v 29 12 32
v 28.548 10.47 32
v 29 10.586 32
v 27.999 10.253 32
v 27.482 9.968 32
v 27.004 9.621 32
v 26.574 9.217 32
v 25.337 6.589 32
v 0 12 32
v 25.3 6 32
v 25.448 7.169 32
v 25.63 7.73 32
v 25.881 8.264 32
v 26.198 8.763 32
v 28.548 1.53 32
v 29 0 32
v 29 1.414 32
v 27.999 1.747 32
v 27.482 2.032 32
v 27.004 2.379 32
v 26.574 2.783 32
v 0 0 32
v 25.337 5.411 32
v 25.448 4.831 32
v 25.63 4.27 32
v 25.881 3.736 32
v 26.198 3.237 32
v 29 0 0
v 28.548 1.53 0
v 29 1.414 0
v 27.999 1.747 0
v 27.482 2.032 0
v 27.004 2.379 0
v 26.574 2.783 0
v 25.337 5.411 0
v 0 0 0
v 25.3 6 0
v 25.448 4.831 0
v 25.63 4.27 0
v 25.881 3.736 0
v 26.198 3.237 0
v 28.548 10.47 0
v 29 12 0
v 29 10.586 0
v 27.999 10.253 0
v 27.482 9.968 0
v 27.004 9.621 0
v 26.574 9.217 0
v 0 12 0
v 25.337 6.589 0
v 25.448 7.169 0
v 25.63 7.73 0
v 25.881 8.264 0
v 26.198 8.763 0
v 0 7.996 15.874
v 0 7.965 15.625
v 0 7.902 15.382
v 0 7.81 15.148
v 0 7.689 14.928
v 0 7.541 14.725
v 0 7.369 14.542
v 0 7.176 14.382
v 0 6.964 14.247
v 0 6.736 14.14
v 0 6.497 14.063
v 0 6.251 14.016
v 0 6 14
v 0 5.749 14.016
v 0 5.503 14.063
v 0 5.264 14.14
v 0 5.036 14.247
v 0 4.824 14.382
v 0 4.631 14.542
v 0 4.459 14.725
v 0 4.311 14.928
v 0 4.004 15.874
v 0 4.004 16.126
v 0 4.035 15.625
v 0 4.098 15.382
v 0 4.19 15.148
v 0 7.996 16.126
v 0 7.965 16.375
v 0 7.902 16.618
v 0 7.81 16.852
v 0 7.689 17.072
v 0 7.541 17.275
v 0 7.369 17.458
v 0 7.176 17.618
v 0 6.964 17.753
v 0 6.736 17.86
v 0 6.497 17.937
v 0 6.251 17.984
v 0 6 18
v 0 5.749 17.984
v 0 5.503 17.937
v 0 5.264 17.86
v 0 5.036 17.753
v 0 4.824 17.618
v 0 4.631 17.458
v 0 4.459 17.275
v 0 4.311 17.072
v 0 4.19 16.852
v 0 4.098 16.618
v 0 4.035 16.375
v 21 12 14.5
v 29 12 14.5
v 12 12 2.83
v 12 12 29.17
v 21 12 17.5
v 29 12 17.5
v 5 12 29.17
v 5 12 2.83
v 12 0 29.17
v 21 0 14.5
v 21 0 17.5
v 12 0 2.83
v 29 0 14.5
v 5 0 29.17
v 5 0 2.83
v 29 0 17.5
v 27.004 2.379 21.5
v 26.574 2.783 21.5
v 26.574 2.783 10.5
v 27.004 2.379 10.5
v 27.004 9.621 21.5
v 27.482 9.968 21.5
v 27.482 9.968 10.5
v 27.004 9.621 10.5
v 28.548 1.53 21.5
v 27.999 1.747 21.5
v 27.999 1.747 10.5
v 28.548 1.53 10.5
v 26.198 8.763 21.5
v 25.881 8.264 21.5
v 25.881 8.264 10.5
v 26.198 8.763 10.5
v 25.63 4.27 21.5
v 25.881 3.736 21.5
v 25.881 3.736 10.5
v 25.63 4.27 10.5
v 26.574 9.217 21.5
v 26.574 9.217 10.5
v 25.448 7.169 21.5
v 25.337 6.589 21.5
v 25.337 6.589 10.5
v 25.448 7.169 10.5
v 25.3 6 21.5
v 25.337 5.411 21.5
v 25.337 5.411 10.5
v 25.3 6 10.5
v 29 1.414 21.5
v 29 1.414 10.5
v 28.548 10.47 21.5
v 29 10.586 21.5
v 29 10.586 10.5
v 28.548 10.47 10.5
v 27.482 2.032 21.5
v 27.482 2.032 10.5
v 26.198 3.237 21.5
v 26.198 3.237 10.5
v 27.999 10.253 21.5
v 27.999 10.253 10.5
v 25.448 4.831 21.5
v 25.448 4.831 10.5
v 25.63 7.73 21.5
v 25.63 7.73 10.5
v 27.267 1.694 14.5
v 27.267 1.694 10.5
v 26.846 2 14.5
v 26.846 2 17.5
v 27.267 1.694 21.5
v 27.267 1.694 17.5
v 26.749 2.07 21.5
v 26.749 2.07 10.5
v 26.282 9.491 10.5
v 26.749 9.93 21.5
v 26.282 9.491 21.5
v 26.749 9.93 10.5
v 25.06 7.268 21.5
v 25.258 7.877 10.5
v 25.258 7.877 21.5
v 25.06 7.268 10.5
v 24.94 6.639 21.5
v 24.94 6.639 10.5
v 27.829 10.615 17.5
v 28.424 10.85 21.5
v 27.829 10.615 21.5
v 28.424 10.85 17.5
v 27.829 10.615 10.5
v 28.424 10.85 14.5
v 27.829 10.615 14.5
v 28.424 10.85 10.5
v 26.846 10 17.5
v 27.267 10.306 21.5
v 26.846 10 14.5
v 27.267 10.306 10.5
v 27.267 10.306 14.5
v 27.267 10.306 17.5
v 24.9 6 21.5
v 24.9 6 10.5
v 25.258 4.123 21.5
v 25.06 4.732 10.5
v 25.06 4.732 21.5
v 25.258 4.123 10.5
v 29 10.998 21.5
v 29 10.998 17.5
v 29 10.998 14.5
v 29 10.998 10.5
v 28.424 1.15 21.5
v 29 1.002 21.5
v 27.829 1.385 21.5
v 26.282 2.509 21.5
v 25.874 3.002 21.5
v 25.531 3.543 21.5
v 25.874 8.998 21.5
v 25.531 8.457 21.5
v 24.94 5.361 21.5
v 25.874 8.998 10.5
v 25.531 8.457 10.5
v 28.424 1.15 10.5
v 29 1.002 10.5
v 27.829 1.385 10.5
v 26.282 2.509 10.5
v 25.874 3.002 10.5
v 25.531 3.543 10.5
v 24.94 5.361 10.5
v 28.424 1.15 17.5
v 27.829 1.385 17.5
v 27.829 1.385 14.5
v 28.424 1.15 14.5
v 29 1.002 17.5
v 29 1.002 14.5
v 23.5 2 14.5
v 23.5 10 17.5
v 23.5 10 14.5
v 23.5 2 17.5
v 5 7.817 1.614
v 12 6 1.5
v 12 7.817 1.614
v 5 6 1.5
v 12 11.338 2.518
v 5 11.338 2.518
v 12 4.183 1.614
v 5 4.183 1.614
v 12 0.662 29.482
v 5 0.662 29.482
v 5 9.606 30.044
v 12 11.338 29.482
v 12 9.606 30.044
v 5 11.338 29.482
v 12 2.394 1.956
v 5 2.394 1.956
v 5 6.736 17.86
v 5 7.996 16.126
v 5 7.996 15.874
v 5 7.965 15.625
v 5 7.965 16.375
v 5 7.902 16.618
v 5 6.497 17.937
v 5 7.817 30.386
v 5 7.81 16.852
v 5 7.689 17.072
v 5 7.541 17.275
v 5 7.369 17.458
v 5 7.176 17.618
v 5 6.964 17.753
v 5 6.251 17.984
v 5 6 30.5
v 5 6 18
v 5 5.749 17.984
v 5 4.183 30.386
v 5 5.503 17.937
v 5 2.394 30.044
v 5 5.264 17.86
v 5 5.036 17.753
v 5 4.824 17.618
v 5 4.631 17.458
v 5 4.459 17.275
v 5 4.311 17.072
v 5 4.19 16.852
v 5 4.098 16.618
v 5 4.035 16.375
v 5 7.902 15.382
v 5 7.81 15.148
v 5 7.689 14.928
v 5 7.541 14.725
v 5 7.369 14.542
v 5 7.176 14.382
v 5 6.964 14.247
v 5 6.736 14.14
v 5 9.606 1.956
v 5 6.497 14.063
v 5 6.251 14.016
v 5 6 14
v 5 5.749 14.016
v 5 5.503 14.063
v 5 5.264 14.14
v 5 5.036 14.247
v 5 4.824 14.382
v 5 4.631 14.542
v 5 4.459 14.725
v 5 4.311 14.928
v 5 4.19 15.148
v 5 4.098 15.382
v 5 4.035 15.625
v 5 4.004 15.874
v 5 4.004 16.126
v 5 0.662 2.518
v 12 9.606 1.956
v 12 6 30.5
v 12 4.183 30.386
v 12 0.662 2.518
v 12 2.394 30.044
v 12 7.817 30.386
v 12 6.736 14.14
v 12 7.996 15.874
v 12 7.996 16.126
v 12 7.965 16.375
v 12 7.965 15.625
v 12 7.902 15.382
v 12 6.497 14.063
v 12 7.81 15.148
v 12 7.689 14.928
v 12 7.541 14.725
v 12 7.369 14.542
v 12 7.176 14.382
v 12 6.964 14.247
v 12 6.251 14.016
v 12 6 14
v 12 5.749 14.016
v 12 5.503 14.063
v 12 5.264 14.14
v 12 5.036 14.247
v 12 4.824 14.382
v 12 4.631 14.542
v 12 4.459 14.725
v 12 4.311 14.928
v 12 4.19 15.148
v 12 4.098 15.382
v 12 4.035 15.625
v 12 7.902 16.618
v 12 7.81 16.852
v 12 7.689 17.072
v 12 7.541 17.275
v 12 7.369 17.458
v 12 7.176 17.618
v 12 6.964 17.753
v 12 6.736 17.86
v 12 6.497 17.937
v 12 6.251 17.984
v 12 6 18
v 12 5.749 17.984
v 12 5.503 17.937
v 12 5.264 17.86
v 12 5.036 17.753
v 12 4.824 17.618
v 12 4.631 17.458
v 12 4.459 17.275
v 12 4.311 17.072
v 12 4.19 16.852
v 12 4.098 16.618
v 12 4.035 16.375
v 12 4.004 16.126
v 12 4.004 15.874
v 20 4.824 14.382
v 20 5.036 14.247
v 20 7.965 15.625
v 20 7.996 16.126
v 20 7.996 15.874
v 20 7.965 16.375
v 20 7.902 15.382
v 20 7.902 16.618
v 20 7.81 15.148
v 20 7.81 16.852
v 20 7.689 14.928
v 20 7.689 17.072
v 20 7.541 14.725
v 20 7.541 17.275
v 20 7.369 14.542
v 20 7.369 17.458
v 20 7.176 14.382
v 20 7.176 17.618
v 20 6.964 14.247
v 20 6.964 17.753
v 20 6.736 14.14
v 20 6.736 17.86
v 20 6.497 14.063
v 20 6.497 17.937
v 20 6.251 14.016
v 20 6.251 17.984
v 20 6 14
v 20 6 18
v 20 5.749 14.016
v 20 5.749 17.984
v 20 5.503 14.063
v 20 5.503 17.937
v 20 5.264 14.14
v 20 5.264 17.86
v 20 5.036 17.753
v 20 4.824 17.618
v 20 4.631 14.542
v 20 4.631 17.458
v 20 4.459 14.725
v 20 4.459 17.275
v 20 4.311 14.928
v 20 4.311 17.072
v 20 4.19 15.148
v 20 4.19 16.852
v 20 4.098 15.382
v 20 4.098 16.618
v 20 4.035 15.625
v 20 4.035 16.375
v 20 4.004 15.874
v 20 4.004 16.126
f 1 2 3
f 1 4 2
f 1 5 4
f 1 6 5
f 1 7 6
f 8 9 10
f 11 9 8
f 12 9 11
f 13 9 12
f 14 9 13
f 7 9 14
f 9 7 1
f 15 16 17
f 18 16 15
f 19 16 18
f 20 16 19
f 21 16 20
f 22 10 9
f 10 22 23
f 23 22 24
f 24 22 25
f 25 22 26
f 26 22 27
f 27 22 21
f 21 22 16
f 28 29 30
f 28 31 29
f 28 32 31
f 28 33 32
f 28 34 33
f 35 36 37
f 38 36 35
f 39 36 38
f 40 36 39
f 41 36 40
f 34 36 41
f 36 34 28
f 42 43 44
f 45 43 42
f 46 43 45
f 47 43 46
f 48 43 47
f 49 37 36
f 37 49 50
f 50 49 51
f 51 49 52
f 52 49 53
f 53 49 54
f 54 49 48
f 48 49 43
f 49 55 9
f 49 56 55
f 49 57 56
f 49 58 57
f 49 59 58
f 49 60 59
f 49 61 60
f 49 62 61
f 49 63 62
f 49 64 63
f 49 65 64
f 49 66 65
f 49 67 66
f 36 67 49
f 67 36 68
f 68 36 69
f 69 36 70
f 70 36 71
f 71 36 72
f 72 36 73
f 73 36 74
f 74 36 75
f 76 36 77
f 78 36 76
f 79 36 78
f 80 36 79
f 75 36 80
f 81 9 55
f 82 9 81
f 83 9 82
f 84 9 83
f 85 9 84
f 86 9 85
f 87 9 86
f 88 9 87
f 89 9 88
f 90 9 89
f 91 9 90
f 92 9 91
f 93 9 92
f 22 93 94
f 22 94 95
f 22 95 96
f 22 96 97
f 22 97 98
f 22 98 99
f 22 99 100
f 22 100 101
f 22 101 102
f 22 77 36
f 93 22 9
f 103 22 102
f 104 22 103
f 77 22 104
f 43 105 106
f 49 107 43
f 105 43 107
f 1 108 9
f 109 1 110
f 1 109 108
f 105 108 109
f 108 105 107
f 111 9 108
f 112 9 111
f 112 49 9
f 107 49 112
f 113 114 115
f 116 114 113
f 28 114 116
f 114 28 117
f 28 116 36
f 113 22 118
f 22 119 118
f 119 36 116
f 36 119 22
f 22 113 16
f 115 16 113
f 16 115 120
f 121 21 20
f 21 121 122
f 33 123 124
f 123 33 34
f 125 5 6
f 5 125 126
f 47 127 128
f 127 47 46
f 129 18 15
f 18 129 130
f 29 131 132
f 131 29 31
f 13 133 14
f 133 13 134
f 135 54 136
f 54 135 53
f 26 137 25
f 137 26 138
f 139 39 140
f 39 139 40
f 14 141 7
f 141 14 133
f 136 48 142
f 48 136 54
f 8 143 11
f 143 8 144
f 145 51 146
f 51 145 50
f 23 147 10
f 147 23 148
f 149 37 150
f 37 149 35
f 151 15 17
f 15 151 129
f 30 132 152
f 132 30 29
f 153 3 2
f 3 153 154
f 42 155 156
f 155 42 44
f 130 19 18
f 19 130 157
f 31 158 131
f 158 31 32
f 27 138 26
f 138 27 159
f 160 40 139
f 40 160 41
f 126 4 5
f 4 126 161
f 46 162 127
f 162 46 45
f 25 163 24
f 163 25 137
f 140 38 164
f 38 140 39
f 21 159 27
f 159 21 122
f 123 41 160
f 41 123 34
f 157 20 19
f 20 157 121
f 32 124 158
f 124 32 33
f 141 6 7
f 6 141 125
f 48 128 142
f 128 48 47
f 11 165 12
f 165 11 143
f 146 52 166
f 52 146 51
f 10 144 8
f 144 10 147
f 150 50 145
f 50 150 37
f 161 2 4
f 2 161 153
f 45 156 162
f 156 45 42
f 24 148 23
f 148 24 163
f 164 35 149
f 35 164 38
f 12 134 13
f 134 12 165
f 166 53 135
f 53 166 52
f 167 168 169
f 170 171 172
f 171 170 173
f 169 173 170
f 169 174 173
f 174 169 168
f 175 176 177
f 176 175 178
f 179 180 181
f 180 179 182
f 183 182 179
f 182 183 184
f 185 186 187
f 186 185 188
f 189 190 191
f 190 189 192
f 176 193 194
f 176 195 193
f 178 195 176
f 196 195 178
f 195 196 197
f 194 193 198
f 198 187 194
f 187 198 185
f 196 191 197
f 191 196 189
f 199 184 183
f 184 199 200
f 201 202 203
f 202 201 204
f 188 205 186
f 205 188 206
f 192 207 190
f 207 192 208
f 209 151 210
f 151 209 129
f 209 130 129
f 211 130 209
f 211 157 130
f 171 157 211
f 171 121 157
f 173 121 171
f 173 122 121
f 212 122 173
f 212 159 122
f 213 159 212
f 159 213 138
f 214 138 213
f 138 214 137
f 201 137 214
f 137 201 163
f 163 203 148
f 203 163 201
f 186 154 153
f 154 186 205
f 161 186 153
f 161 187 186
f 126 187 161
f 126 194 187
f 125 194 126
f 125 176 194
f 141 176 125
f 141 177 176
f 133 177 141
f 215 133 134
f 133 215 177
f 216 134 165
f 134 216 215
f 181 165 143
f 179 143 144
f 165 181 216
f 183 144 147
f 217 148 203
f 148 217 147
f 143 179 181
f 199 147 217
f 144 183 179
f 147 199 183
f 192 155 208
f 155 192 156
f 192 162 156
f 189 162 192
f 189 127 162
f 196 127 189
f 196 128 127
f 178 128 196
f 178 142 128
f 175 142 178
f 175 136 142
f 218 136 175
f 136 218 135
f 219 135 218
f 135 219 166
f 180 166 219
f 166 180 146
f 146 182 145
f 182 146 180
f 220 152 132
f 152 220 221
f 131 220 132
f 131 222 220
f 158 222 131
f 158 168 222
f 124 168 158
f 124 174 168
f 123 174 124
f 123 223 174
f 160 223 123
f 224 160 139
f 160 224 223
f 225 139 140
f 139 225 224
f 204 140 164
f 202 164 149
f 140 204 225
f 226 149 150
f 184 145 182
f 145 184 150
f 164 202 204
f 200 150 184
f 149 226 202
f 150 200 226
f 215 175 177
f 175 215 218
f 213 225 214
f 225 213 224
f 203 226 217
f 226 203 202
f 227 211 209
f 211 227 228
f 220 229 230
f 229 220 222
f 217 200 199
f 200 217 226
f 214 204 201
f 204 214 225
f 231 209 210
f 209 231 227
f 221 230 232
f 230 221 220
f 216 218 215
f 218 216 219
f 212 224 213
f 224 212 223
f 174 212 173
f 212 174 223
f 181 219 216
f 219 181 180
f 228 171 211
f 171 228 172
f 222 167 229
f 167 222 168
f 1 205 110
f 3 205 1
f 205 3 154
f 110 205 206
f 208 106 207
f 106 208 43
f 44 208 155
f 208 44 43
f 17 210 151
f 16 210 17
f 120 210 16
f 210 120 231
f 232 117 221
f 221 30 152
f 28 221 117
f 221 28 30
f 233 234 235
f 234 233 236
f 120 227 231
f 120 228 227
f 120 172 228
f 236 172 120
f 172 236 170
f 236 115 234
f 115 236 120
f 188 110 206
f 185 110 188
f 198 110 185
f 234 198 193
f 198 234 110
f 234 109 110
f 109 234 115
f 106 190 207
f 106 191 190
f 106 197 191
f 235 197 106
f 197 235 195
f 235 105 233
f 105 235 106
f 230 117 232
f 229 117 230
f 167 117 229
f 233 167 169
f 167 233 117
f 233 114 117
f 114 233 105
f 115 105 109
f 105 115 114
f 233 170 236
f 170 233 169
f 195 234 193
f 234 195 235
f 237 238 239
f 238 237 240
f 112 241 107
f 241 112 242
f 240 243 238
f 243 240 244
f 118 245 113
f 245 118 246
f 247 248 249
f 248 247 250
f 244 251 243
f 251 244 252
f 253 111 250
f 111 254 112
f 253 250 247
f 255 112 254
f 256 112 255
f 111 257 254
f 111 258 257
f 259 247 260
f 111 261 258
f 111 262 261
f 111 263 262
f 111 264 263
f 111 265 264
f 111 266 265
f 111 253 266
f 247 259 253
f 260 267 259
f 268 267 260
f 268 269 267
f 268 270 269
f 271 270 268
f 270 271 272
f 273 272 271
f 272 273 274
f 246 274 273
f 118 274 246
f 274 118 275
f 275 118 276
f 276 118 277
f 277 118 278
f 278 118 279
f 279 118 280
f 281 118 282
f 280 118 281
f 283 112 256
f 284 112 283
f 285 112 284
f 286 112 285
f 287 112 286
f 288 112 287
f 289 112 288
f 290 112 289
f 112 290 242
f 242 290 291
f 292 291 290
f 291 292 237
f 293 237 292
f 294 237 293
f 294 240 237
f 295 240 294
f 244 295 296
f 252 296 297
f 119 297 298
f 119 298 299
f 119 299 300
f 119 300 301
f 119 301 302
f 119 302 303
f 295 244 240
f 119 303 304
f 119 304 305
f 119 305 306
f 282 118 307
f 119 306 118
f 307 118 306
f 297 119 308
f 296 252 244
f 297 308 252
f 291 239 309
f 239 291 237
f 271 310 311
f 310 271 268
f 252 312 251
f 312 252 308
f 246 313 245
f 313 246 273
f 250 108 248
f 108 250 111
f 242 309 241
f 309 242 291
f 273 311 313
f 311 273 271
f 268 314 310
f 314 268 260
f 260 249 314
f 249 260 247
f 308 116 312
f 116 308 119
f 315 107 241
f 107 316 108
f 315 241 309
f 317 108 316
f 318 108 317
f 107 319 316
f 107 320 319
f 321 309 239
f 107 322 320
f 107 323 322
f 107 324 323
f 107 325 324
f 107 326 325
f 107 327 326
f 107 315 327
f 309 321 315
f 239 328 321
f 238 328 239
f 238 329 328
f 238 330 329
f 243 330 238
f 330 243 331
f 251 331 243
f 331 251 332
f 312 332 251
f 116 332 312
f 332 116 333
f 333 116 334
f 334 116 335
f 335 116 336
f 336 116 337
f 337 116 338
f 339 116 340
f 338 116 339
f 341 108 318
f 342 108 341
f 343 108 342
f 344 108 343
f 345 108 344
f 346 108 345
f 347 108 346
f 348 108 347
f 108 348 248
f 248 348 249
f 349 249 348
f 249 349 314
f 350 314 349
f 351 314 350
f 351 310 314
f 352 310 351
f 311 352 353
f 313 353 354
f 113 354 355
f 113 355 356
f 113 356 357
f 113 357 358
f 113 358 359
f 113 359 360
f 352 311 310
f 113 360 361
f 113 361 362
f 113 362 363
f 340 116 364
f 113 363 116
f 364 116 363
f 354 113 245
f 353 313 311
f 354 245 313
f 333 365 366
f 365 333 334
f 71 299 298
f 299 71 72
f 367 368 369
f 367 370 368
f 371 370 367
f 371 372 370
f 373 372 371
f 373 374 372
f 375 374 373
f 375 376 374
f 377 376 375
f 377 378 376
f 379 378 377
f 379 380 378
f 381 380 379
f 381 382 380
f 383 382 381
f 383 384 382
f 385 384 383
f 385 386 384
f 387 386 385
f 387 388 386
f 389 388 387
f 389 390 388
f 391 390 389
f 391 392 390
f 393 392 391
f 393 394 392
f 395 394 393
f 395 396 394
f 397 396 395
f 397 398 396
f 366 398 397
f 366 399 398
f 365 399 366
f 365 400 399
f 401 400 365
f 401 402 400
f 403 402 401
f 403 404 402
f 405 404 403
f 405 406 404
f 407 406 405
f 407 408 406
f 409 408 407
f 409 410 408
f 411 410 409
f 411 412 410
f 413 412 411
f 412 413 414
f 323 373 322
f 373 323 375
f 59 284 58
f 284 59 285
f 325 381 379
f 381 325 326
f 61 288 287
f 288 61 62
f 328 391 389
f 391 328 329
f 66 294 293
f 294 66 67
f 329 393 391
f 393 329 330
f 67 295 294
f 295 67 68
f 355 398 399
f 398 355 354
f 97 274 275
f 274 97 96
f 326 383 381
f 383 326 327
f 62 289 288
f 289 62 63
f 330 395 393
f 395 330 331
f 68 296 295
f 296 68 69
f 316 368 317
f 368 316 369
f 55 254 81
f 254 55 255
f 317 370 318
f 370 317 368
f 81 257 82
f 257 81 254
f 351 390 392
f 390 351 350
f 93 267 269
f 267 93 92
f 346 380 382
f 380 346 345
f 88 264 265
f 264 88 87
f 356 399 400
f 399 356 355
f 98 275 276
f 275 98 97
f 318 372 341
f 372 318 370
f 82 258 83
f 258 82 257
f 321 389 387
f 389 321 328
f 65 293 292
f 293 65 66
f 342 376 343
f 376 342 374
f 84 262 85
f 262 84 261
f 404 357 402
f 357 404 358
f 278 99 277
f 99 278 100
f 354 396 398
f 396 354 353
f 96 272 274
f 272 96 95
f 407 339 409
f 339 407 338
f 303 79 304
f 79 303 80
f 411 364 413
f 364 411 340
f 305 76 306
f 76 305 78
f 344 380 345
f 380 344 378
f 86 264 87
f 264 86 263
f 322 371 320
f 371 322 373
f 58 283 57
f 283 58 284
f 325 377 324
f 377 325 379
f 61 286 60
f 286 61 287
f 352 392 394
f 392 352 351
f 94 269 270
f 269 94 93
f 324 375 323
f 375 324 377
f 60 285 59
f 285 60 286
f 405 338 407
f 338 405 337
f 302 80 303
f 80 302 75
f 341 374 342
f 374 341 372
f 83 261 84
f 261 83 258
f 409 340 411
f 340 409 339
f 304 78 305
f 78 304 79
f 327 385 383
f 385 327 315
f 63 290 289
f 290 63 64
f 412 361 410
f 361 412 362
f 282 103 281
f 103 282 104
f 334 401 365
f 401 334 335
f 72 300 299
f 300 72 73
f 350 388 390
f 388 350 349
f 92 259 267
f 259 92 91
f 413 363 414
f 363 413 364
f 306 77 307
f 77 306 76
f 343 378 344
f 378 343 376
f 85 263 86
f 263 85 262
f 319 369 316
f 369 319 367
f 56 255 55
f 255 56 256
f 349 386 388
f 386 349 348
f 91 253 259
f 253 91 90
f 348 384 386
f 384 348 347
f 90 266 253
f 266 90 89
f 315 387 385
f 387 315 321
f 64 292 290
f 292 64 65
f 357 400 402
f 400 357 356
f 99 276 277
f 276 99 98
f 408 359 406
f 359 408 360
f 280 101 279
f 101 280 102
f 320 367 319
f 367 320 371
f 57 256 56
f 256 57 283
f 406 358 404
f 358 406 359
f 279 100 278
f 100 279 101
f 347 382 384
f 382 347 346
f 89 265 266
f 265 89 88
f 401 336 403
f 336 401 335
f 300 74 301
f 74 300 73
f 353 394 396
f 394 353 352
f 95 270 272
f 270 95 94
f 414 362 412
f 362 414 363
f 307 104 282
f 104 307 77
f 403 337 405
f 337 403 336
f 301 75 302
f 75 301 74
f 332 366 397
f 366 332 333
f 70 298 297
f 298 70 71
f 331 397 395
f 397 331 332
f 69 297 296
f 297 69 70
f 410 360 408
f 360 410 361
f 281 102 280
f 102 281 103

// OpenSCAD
h_douille=11;
r_douille=5;
long=30;
larg=12;
haut=32;
trou_m3=2;
molette=25;
evid=8;
r_evid=2;
h_evid=3;
r_col=1.5;

module support_douille_y(){
	difference(){
		cube([long,larg,haut]);
		
		//creu pour passer douille
		translate([long,larg/2,-5]){cylinder(r=r_douille-0.3, h=haut+10, $fn=50);}
		translate([long,larg/2,(haut-h_douille)/2]){cylinder(r=r_douille+0.1, h=h_douille, $fn=50);}
		translate([long-1,-5,-5]){cube([10,larg+10,haut+10]);}

		//trou pour collier douille
		//translate([long-r_douille-2.5,-5,haut/2]){rotate([-90,0,0])cylinder(r=r_col, h=larg+10, $fn=50);}
		translate([long-r_douille-2.5-r_col,-5,haut/2-r_col]){cube([r_col+1,larg+10,r_col*2]);}
		translate([long-r_douille-2.5-1,-5,haut/2-r_col]){cube([20,7,r_col*2]);}
		translate([long-r_douille-2.5-1,larg-2,haut/2-r_col]){cube([20,7,r_col*2]);}

		//passage pour molette
		translate([5,larg/2,haut/2]){rotate([0,90,0])cylinder(r=molette/2+2, h=7, $fn=50);}

		//trou pour passage vis plateau
		translate([-5,larg/2,haut/2]){rotate([0,90,0])cylinder(r=trou_m3, h=long-5, $fn=50);}

	}
}
support_douille_y();
